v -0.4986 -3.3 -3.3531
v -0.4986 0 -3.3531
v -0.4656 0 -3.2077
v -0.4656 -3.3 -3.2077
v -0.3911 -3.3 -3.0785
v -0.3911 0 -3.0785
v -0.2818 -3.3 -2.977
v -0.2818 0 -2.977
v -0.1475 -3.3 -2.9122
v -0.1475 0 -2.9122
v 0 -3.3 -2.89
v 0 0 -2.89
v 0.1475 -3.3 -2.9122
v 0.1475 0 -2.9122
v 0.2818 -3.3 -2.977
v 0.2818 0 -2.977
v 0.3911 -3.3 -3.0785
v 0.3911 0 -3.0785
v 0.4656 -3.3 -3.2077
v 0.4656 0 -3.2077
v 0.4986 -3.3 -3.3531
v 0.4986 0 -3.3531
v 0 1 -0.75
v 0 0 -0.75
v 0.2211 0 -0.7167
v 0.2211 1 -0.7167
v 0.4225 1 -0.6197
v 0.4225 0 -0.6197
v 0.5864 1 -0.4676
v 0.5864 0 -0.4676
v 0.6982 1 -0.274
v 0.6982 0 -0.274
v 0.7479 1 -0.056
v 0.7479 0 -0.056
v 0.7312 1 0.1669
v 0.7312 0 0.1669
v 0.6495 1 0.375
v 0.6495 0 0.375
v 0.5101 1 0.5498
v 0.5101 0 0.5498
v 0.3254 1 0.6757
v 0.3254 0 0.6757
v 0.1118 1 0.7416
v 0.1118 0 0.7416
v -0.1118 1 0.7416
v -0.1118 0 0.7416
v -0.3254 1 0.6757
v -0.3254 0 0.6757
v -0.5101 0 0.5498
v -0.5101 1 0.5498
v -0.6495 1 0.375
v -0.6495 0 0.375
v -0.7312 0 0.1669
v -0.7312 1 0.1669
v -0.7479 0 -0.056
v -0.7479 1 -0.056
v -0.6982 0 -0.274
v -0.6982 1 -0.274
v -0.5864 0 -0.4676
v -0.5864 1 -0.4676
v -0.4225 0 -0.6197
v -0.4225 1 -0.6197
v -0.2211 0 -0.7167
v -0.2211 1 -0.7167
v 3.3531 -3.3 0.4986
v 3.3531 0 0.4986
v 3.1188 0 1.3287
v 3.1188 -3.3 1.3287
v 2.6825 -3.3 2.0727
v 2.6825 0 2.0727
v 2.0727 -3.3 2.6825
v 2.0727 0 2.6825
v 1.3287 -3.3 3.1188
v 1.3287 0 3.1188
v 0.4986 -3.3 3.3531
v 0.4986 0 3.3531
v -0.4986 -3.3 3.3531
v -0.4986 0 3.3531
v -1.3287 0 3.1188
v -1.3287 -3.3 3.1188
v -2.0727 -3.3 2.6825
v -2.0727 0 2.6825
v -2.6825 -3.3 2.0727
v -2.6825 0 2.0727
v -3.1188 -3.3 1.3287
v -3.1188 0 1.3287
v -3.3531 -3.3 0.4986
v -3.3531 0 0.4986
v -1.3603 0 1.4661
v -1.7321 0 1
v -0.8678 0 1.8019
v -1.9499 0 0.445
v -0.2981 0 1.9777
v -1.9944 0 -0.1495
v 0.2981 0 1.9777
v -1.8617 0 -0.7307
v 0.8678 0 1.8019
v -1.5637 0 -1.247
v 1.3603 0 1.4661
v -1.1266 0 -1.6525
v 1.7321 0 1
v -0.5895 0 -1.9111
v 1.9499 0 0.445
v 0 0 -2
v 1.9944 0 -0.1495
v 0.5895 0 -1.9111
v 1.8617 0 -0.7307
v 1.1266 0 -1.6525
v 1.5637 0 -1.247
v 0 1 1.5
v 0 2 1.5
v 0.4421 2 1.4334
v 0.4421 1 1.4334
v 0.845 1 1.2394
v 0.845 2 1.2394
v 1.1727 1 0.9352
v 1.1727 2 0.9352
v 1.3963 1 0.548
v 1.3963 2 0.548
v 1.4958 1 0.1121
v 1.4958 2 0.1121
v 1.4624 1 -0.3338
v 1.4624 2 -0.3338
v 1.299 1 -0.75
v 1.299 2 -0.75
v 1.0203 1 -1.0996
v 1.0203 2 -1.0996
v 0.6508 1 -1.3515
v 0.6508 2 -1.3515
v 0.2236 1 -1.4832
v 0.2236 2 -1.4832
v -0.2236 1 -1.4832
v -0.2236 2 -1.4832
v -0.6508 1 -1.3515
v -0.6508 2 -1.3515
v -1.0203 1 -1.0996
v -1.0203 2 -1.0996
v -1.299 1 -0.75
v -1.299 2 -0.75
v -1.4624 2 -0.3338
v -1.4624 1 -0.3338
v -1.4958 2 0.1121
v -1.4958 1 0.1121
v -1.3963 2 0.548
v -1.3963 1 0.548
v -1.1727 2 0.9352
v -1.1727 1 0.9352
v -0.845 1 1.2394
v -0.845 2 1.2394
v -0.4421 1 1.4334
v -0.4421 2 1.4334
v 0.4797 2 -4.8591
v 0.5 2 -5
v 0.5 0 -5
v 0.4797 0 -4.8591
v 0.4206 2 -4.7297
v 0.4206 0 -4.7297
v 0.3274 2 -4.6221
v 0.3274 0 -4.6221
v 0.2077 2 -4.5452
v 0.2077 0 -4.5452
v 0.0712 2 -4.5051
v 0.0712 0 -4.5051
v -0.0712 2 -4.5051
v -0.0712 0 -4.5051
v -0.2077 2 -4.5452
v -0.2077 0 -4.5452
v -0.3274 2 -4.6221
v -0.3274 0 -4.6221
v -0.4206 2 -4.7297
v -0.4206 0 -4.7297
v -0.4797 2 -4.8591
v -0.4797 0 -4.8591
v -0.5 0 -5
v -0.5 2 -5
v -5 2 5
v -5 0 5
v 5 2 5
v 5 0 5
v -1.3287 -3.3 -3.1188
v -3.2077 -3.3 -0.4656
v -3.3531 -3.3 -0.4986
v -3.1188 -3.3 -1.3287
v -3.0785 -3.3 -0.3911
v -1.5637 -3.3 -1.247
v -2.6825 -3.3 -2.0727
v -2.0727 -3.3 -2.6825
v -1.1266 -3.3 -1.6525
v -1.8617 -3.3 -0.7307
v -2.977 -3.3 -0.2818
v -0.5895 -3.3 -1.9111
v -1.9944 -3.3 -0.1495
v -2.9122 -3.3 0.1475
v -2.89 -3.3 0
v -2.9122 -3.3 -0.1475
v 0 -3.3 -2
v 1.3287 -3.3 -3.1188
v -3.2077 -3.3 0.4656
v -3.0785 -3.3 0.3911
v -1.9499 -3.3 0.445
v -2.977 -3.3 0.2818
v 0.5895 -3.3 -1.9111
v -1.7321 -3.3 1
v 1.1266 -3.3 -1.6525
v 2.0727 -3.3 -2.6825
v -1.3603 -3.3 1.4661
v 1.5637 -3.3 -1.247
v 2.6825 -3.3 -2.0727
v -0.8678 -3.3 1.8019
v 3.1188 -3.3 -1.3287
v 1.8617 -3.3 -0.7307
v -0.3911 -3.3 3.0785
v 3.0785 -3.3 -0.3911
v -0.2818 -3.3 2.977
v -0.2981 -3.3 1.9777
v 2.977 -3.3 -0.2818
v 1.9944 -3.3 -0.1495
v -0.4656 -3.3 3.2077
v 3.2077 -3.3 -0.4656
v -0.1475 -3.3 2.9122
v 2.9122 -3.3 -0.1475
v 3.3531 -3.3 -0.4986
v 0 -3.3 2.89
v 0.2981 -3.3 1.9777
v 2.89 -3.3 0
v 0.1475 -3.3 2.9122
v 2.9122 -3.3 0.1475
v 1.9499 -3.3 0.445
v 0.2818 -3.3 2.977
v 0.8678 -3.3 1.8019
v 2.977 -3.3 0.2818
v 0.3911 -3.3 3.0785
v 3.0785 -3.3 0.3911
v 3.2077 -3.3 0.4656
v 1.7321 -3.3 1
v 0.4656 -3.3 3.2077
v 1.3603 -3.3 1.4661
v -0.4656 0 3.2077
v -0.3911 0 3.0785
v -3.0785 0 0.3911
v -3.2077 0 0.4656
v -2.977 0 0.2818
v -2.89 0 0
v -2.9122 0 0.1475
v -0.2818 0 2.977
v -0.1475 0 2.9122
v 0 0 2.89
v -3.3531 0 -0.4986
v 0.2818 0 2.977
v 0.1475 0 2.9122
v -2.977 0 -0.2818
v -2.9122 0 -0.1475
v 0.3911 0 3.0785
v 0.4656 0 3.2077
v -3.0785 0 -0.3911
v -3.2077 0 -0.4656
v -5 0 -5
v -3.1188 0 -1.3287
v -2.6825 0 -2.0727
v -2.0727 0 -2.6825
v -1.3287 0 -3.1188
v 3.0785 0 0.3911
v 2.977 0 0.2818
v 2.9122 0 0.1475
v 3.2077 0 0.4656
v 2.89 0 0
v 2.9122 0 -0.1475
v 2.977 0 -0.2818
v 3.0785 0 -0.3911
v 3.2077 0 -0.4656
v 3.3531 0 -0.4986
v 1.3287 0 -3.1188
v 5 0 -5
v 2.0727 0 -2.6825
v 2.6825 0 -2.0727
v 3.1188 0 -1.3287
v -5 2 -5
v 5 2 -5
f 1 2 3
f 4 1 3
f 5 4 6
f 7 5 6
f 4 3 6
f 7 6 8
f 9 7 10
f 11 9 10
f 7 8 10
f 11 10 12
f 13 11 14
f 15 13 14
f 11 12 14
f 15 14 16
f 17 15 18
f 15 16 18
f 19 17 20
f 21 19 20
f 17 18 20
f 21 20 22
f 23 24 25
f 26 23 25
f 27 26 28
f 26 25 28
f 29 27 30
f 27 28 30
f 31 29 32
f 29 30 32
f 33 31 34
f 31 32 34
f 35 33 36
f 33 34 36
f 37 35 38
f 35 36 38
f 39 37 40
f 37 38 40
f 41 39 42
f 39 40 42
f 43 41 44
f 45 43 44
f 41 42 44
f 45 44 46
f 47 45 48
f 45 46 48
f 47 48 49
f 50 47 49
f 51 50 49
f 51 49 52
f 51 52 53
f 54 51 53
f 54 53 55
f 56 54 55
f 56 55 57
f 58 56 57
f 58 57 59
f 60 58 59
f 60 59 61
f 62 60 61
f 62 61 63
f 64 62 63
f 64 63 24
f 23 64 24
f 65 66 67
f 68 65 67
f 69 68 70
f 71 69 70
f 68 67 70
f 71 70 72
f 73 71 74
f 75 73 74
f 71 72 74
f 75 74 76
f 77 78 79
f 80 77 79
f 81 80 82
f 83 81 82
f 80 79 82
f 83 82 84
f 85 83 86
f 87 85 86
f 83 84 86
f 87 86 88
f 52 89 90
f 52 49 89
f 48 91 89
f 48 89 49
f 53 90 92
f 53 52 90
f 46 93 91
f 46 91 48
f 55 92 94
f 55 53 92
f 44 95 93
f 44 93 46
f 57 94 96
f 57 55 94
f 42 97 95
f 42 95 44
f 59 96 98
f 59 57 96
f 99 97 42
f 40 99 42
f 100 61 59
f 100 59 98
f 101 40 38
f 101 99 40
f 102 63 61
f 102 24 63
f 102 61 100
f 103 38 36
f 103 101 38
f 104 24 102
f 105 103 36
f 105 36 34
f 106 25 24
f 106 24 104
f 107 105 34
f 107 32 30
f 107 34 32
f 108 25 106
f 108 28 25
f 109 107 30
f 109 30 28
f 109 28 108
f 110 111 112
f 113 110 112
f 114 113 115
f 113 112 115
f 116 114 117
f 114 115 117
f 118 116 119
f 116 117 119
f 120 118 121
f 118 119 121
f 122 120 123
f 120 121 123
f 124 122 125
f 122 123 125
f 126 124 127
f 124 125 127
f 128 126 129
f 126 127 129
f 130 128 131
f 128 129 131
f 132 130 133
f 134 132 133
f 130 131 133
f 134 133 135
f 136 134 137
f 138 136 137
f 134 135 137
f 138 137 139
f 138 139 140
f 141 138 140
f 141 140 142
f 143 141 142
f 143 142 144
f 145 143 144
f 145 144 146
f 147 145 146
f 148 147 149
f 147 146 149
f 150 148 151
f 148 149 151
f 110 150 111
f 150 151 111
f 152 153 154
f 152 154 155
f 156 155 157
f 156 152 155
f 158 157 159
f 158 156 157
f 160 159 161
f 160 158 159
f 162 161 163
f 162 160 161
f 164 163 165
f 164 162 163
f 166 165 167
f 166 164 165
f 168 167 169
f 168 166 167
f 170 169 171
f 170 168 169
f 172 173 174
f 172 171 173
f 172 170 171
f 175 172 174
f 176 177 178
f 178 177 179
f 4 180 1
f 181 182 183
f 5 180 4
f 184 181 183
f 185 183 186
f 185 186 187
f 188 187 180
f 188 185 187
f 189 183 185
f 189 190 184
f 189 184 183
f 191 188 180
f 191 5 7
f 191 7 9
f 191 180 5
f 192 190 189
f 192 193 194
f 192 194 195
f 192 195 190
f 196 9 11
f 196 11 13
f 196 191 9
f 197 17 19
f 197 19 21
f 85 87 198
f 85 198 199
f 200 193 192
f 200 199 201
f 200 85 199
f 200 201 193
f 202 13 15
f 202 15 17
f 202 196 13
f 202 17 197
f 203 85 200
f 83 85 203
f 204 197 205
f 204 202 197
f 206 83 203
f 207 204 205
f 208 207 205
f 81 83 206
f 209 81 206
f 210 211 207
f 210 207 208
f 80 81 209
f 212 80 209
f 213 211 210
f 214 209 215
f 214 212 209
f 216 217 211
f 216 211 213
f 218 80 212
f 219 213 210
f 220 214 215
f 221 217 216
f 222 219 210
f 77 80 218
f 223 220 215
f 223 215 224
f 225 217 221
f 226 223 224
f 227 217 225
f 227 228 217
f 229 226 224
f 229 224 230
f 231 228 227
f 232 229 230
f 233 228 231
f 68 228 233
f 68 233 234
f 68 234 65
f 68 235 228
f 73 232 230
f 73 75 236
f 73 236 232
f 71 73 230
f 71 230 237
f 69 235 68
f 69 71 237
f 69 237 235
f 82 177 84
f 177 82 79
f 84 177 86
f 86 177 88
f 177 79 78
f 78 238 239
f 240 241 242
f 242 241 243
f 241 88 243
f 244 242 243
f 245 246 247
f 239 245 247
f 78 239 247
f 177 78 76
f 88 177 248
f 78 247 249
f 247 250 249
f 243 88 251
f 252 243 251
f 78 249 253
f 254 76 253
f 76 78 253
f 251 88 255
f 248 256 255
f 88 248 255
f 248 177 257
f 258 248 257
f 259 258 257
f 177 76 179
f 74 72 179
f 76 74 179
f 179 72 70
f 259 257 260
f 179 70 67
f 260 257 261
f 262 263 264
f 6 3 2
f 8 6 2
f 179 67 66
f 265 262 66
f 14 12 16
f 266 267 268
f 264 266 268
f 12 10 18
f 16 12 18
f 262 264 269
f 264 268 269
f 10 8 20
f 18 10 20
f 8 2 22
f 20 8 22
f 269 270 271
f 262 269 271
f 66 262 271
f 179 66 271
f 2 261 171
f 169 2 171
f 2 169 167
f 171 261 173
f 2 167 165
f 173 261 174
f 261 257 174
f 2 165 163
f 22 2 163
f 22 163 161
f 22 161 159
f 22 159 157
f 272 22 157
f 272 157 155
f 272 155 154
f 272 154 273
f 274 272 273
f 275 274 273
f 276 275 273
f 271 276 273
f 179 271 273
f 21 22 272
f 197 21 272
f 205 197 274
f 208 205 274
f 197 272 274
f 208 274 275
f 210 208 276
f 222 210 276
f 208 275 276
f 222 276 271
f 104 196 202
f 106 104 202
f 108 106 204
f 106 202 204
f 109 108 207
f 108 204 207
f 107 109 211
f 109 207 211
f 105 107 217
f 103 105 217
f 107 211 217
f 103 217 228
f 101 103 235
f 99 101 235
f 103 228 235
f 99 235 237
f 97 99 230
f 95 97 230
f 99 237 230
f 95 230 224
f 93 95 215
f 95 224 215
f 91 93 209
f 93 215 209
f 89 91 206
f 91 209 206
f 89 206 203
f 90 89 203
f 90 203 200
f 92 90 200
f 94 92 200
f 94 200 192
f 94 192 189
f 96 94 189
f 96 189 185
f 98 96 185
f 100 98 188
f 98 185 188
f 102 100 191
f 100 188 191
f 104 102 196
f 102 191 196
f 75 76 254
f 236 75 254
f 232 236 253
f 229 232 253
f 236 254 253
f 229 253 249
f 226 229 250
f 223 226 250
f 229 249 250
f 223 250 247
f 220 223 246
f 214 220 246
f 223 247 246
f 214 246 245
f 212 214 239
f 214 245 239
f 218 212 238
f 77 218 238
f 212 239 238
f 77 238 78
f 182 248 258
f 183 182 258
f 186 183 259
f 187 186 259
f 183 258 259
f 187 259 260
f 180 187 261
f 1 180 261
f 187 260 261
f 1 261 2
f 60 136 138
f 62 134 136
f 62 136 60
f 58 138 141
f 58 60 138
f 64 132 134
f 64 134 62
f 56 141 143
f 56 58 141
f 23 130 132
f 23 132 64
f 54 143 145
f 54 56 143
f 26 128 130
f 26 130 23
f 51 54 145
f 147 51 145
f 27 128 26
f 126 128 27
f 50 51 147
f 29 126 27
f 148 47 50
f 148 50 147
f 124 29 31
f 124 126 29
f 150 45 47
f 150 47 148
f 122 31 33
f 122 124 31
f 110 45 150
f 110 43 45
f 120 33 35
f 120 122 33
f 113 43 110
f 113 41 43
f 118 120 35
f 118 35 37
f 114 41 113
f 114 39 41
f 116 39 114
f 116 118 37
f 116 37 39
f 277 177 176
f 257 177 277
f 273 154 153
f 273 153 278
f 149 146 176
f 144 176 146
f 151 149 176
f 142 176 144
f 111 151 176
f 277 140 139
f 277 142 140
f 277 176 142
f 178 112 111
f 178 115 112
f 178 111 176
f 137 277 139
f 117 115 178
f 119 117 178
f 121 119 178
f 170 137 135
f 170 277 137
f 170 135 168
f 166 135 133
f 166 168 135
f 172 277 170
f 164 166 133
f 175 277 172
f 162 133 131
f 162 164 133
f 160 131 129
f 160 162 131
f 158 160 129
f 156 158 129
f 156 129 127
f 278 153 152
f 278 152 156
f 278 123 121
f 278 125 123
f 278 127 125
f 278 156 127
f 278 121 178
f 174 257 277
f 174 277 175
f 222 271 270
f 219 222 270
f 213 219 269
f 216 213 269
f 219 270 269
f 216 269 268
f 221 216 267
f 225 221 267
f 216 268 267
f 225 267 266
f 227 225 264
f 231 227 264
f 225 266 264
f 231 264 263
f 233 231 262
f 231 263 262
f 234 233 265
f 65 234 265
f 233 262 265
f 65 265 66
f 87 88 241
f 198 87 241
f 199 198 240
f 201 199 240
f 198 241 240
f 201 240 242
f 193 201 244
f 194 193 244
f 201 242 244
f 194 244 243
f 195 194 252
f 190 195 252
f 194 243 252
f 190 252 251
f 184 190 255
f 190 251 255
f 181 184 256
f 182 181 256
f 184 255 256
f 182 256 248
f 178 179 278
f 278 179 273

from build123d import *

# Parameters (mm, degrees)
SKETCH_1_W          = 10
SKETCH_1_H          = 10
EXTRUDE_1_DEPTH     = 2
EXTRUDE_2_DEPTH     = 3.3
SKETCH_3_R          = 2
CUT_EXTRUDE_1_DEPTH = 3.3
SKETCH_4_R          = 0.75
CUT_EXTRUDE_2_DEPTH = 3.3
SKETCH_5_R          = 1.5
CUT_EXTRUDE_3_DEPTH = 1
CUT_EXTRUDE_4_DEPTH = 9.836854644


with BuildPart() as part:
    # 草图1 → 凸台-拉伸1 (new body)
    with BuildSketch(Plane(origin=(0, 0, 0), x_dir=(1, 0, 0), z_dir=(0, 1, 0))):
        Rectangle(SKETCH_1_W, SKETCH_1_H)
    extrude(amount=EXTRUDE_1_DEPTH)

    # 草图2 → 凸台-拉伸2 (add)
    with BuildSketch(Plane.XZ):
        with BuildLine():
            ThreePointArc((-3.353126844, -0.498638517), (-2.397091988, -2.397091988), (-0.498638517, -3.353126844))
            ThreePointArc((-0.498638517, -3.353126844), (0, -2.89), (0.498638517, -3.353126844))
            ThreePointArc((0.498638517, -3.353126844), (2.397091988, -2.397091988), (3.353126844, -0.498638517))
            ThreePointArc((3.353126844, -0.498638517), (2.89, 0), (3.353126844, 0.498638517))
            ThreePointArc((3.353126844, 0.498638517), (2.397091988, 2.397091988), (0.498638517, 3.353126844))
            ThreePointArc((0.498638517, 3.353126844), (0, 2.89), (-0.498638517, 3.353126844))
            ThreePointArc((-0.498638517, 3.353126844), (-2.397091988, 2.397091988), (-3.353126844, 0.498638517))
            ThreePointArc((-3.353126844, 0.498638517), (-2.89, 0), (-3.353126844, -0.498638517))
        make_face()
    extrude(amount=EXTRUDE_2_DEPTH)

    # 草图3 → 切除-拉伸1 (cut)
    with BuildSketch(Plane.XZ.offset(3.3)):
        with Locations(Location((0, 0, 0), (0, 0, 270))):
            Circle(SKETCH_3_R)
    extrude(amount=-CUT_EXTRUDE_1_DEPTH, mode=Mode.SUBTRACT)

    # 草图4 → 切除-拉伸2 (cut)
    with BuildSketch(Plane.XZ):
        with Locations(Location((0, 0, 0), (0, 0, 270))):
            Circle(SKETCH_4_R)
    extrude(amount=-CUT_EXTRUDE_2_DEPTH, mode=Mode.SUBTRACT)

    # 草图5 → 切除-拉伸3 (cut)
    with BuildSketch(Plane(origin=(0, 2, 0), x_dir=(1, 0, 0), z_dir=(0, 1, 0))):
        with Locations(Location((0, 0, 0), (0, 0, 270))):
            Circle(SKETCH_5_R)
    extrude(amount=-CUT_EXTRUDE_3_DEPTH, mode=Mode.SUBTRACT)

    # 草图6 → 切除-拉伸4 (cut, through all)
    with BuildSketch(Plane(origin=(0, 2, 0), x_dir=(1, 0, 0), z_dir=(0, 1, 0))):
        with BuildLine():
            Line((-0.5, 5), (0.5, 5))
            ThreePointArc((0.5, 5), (0, 4.5), (-0.5, 5))
        make_face()
    extrude(amount=-CUT_EXTRUDE_4_DEPTH, mode=Mode.SUBTRACT)


solid = part.part
